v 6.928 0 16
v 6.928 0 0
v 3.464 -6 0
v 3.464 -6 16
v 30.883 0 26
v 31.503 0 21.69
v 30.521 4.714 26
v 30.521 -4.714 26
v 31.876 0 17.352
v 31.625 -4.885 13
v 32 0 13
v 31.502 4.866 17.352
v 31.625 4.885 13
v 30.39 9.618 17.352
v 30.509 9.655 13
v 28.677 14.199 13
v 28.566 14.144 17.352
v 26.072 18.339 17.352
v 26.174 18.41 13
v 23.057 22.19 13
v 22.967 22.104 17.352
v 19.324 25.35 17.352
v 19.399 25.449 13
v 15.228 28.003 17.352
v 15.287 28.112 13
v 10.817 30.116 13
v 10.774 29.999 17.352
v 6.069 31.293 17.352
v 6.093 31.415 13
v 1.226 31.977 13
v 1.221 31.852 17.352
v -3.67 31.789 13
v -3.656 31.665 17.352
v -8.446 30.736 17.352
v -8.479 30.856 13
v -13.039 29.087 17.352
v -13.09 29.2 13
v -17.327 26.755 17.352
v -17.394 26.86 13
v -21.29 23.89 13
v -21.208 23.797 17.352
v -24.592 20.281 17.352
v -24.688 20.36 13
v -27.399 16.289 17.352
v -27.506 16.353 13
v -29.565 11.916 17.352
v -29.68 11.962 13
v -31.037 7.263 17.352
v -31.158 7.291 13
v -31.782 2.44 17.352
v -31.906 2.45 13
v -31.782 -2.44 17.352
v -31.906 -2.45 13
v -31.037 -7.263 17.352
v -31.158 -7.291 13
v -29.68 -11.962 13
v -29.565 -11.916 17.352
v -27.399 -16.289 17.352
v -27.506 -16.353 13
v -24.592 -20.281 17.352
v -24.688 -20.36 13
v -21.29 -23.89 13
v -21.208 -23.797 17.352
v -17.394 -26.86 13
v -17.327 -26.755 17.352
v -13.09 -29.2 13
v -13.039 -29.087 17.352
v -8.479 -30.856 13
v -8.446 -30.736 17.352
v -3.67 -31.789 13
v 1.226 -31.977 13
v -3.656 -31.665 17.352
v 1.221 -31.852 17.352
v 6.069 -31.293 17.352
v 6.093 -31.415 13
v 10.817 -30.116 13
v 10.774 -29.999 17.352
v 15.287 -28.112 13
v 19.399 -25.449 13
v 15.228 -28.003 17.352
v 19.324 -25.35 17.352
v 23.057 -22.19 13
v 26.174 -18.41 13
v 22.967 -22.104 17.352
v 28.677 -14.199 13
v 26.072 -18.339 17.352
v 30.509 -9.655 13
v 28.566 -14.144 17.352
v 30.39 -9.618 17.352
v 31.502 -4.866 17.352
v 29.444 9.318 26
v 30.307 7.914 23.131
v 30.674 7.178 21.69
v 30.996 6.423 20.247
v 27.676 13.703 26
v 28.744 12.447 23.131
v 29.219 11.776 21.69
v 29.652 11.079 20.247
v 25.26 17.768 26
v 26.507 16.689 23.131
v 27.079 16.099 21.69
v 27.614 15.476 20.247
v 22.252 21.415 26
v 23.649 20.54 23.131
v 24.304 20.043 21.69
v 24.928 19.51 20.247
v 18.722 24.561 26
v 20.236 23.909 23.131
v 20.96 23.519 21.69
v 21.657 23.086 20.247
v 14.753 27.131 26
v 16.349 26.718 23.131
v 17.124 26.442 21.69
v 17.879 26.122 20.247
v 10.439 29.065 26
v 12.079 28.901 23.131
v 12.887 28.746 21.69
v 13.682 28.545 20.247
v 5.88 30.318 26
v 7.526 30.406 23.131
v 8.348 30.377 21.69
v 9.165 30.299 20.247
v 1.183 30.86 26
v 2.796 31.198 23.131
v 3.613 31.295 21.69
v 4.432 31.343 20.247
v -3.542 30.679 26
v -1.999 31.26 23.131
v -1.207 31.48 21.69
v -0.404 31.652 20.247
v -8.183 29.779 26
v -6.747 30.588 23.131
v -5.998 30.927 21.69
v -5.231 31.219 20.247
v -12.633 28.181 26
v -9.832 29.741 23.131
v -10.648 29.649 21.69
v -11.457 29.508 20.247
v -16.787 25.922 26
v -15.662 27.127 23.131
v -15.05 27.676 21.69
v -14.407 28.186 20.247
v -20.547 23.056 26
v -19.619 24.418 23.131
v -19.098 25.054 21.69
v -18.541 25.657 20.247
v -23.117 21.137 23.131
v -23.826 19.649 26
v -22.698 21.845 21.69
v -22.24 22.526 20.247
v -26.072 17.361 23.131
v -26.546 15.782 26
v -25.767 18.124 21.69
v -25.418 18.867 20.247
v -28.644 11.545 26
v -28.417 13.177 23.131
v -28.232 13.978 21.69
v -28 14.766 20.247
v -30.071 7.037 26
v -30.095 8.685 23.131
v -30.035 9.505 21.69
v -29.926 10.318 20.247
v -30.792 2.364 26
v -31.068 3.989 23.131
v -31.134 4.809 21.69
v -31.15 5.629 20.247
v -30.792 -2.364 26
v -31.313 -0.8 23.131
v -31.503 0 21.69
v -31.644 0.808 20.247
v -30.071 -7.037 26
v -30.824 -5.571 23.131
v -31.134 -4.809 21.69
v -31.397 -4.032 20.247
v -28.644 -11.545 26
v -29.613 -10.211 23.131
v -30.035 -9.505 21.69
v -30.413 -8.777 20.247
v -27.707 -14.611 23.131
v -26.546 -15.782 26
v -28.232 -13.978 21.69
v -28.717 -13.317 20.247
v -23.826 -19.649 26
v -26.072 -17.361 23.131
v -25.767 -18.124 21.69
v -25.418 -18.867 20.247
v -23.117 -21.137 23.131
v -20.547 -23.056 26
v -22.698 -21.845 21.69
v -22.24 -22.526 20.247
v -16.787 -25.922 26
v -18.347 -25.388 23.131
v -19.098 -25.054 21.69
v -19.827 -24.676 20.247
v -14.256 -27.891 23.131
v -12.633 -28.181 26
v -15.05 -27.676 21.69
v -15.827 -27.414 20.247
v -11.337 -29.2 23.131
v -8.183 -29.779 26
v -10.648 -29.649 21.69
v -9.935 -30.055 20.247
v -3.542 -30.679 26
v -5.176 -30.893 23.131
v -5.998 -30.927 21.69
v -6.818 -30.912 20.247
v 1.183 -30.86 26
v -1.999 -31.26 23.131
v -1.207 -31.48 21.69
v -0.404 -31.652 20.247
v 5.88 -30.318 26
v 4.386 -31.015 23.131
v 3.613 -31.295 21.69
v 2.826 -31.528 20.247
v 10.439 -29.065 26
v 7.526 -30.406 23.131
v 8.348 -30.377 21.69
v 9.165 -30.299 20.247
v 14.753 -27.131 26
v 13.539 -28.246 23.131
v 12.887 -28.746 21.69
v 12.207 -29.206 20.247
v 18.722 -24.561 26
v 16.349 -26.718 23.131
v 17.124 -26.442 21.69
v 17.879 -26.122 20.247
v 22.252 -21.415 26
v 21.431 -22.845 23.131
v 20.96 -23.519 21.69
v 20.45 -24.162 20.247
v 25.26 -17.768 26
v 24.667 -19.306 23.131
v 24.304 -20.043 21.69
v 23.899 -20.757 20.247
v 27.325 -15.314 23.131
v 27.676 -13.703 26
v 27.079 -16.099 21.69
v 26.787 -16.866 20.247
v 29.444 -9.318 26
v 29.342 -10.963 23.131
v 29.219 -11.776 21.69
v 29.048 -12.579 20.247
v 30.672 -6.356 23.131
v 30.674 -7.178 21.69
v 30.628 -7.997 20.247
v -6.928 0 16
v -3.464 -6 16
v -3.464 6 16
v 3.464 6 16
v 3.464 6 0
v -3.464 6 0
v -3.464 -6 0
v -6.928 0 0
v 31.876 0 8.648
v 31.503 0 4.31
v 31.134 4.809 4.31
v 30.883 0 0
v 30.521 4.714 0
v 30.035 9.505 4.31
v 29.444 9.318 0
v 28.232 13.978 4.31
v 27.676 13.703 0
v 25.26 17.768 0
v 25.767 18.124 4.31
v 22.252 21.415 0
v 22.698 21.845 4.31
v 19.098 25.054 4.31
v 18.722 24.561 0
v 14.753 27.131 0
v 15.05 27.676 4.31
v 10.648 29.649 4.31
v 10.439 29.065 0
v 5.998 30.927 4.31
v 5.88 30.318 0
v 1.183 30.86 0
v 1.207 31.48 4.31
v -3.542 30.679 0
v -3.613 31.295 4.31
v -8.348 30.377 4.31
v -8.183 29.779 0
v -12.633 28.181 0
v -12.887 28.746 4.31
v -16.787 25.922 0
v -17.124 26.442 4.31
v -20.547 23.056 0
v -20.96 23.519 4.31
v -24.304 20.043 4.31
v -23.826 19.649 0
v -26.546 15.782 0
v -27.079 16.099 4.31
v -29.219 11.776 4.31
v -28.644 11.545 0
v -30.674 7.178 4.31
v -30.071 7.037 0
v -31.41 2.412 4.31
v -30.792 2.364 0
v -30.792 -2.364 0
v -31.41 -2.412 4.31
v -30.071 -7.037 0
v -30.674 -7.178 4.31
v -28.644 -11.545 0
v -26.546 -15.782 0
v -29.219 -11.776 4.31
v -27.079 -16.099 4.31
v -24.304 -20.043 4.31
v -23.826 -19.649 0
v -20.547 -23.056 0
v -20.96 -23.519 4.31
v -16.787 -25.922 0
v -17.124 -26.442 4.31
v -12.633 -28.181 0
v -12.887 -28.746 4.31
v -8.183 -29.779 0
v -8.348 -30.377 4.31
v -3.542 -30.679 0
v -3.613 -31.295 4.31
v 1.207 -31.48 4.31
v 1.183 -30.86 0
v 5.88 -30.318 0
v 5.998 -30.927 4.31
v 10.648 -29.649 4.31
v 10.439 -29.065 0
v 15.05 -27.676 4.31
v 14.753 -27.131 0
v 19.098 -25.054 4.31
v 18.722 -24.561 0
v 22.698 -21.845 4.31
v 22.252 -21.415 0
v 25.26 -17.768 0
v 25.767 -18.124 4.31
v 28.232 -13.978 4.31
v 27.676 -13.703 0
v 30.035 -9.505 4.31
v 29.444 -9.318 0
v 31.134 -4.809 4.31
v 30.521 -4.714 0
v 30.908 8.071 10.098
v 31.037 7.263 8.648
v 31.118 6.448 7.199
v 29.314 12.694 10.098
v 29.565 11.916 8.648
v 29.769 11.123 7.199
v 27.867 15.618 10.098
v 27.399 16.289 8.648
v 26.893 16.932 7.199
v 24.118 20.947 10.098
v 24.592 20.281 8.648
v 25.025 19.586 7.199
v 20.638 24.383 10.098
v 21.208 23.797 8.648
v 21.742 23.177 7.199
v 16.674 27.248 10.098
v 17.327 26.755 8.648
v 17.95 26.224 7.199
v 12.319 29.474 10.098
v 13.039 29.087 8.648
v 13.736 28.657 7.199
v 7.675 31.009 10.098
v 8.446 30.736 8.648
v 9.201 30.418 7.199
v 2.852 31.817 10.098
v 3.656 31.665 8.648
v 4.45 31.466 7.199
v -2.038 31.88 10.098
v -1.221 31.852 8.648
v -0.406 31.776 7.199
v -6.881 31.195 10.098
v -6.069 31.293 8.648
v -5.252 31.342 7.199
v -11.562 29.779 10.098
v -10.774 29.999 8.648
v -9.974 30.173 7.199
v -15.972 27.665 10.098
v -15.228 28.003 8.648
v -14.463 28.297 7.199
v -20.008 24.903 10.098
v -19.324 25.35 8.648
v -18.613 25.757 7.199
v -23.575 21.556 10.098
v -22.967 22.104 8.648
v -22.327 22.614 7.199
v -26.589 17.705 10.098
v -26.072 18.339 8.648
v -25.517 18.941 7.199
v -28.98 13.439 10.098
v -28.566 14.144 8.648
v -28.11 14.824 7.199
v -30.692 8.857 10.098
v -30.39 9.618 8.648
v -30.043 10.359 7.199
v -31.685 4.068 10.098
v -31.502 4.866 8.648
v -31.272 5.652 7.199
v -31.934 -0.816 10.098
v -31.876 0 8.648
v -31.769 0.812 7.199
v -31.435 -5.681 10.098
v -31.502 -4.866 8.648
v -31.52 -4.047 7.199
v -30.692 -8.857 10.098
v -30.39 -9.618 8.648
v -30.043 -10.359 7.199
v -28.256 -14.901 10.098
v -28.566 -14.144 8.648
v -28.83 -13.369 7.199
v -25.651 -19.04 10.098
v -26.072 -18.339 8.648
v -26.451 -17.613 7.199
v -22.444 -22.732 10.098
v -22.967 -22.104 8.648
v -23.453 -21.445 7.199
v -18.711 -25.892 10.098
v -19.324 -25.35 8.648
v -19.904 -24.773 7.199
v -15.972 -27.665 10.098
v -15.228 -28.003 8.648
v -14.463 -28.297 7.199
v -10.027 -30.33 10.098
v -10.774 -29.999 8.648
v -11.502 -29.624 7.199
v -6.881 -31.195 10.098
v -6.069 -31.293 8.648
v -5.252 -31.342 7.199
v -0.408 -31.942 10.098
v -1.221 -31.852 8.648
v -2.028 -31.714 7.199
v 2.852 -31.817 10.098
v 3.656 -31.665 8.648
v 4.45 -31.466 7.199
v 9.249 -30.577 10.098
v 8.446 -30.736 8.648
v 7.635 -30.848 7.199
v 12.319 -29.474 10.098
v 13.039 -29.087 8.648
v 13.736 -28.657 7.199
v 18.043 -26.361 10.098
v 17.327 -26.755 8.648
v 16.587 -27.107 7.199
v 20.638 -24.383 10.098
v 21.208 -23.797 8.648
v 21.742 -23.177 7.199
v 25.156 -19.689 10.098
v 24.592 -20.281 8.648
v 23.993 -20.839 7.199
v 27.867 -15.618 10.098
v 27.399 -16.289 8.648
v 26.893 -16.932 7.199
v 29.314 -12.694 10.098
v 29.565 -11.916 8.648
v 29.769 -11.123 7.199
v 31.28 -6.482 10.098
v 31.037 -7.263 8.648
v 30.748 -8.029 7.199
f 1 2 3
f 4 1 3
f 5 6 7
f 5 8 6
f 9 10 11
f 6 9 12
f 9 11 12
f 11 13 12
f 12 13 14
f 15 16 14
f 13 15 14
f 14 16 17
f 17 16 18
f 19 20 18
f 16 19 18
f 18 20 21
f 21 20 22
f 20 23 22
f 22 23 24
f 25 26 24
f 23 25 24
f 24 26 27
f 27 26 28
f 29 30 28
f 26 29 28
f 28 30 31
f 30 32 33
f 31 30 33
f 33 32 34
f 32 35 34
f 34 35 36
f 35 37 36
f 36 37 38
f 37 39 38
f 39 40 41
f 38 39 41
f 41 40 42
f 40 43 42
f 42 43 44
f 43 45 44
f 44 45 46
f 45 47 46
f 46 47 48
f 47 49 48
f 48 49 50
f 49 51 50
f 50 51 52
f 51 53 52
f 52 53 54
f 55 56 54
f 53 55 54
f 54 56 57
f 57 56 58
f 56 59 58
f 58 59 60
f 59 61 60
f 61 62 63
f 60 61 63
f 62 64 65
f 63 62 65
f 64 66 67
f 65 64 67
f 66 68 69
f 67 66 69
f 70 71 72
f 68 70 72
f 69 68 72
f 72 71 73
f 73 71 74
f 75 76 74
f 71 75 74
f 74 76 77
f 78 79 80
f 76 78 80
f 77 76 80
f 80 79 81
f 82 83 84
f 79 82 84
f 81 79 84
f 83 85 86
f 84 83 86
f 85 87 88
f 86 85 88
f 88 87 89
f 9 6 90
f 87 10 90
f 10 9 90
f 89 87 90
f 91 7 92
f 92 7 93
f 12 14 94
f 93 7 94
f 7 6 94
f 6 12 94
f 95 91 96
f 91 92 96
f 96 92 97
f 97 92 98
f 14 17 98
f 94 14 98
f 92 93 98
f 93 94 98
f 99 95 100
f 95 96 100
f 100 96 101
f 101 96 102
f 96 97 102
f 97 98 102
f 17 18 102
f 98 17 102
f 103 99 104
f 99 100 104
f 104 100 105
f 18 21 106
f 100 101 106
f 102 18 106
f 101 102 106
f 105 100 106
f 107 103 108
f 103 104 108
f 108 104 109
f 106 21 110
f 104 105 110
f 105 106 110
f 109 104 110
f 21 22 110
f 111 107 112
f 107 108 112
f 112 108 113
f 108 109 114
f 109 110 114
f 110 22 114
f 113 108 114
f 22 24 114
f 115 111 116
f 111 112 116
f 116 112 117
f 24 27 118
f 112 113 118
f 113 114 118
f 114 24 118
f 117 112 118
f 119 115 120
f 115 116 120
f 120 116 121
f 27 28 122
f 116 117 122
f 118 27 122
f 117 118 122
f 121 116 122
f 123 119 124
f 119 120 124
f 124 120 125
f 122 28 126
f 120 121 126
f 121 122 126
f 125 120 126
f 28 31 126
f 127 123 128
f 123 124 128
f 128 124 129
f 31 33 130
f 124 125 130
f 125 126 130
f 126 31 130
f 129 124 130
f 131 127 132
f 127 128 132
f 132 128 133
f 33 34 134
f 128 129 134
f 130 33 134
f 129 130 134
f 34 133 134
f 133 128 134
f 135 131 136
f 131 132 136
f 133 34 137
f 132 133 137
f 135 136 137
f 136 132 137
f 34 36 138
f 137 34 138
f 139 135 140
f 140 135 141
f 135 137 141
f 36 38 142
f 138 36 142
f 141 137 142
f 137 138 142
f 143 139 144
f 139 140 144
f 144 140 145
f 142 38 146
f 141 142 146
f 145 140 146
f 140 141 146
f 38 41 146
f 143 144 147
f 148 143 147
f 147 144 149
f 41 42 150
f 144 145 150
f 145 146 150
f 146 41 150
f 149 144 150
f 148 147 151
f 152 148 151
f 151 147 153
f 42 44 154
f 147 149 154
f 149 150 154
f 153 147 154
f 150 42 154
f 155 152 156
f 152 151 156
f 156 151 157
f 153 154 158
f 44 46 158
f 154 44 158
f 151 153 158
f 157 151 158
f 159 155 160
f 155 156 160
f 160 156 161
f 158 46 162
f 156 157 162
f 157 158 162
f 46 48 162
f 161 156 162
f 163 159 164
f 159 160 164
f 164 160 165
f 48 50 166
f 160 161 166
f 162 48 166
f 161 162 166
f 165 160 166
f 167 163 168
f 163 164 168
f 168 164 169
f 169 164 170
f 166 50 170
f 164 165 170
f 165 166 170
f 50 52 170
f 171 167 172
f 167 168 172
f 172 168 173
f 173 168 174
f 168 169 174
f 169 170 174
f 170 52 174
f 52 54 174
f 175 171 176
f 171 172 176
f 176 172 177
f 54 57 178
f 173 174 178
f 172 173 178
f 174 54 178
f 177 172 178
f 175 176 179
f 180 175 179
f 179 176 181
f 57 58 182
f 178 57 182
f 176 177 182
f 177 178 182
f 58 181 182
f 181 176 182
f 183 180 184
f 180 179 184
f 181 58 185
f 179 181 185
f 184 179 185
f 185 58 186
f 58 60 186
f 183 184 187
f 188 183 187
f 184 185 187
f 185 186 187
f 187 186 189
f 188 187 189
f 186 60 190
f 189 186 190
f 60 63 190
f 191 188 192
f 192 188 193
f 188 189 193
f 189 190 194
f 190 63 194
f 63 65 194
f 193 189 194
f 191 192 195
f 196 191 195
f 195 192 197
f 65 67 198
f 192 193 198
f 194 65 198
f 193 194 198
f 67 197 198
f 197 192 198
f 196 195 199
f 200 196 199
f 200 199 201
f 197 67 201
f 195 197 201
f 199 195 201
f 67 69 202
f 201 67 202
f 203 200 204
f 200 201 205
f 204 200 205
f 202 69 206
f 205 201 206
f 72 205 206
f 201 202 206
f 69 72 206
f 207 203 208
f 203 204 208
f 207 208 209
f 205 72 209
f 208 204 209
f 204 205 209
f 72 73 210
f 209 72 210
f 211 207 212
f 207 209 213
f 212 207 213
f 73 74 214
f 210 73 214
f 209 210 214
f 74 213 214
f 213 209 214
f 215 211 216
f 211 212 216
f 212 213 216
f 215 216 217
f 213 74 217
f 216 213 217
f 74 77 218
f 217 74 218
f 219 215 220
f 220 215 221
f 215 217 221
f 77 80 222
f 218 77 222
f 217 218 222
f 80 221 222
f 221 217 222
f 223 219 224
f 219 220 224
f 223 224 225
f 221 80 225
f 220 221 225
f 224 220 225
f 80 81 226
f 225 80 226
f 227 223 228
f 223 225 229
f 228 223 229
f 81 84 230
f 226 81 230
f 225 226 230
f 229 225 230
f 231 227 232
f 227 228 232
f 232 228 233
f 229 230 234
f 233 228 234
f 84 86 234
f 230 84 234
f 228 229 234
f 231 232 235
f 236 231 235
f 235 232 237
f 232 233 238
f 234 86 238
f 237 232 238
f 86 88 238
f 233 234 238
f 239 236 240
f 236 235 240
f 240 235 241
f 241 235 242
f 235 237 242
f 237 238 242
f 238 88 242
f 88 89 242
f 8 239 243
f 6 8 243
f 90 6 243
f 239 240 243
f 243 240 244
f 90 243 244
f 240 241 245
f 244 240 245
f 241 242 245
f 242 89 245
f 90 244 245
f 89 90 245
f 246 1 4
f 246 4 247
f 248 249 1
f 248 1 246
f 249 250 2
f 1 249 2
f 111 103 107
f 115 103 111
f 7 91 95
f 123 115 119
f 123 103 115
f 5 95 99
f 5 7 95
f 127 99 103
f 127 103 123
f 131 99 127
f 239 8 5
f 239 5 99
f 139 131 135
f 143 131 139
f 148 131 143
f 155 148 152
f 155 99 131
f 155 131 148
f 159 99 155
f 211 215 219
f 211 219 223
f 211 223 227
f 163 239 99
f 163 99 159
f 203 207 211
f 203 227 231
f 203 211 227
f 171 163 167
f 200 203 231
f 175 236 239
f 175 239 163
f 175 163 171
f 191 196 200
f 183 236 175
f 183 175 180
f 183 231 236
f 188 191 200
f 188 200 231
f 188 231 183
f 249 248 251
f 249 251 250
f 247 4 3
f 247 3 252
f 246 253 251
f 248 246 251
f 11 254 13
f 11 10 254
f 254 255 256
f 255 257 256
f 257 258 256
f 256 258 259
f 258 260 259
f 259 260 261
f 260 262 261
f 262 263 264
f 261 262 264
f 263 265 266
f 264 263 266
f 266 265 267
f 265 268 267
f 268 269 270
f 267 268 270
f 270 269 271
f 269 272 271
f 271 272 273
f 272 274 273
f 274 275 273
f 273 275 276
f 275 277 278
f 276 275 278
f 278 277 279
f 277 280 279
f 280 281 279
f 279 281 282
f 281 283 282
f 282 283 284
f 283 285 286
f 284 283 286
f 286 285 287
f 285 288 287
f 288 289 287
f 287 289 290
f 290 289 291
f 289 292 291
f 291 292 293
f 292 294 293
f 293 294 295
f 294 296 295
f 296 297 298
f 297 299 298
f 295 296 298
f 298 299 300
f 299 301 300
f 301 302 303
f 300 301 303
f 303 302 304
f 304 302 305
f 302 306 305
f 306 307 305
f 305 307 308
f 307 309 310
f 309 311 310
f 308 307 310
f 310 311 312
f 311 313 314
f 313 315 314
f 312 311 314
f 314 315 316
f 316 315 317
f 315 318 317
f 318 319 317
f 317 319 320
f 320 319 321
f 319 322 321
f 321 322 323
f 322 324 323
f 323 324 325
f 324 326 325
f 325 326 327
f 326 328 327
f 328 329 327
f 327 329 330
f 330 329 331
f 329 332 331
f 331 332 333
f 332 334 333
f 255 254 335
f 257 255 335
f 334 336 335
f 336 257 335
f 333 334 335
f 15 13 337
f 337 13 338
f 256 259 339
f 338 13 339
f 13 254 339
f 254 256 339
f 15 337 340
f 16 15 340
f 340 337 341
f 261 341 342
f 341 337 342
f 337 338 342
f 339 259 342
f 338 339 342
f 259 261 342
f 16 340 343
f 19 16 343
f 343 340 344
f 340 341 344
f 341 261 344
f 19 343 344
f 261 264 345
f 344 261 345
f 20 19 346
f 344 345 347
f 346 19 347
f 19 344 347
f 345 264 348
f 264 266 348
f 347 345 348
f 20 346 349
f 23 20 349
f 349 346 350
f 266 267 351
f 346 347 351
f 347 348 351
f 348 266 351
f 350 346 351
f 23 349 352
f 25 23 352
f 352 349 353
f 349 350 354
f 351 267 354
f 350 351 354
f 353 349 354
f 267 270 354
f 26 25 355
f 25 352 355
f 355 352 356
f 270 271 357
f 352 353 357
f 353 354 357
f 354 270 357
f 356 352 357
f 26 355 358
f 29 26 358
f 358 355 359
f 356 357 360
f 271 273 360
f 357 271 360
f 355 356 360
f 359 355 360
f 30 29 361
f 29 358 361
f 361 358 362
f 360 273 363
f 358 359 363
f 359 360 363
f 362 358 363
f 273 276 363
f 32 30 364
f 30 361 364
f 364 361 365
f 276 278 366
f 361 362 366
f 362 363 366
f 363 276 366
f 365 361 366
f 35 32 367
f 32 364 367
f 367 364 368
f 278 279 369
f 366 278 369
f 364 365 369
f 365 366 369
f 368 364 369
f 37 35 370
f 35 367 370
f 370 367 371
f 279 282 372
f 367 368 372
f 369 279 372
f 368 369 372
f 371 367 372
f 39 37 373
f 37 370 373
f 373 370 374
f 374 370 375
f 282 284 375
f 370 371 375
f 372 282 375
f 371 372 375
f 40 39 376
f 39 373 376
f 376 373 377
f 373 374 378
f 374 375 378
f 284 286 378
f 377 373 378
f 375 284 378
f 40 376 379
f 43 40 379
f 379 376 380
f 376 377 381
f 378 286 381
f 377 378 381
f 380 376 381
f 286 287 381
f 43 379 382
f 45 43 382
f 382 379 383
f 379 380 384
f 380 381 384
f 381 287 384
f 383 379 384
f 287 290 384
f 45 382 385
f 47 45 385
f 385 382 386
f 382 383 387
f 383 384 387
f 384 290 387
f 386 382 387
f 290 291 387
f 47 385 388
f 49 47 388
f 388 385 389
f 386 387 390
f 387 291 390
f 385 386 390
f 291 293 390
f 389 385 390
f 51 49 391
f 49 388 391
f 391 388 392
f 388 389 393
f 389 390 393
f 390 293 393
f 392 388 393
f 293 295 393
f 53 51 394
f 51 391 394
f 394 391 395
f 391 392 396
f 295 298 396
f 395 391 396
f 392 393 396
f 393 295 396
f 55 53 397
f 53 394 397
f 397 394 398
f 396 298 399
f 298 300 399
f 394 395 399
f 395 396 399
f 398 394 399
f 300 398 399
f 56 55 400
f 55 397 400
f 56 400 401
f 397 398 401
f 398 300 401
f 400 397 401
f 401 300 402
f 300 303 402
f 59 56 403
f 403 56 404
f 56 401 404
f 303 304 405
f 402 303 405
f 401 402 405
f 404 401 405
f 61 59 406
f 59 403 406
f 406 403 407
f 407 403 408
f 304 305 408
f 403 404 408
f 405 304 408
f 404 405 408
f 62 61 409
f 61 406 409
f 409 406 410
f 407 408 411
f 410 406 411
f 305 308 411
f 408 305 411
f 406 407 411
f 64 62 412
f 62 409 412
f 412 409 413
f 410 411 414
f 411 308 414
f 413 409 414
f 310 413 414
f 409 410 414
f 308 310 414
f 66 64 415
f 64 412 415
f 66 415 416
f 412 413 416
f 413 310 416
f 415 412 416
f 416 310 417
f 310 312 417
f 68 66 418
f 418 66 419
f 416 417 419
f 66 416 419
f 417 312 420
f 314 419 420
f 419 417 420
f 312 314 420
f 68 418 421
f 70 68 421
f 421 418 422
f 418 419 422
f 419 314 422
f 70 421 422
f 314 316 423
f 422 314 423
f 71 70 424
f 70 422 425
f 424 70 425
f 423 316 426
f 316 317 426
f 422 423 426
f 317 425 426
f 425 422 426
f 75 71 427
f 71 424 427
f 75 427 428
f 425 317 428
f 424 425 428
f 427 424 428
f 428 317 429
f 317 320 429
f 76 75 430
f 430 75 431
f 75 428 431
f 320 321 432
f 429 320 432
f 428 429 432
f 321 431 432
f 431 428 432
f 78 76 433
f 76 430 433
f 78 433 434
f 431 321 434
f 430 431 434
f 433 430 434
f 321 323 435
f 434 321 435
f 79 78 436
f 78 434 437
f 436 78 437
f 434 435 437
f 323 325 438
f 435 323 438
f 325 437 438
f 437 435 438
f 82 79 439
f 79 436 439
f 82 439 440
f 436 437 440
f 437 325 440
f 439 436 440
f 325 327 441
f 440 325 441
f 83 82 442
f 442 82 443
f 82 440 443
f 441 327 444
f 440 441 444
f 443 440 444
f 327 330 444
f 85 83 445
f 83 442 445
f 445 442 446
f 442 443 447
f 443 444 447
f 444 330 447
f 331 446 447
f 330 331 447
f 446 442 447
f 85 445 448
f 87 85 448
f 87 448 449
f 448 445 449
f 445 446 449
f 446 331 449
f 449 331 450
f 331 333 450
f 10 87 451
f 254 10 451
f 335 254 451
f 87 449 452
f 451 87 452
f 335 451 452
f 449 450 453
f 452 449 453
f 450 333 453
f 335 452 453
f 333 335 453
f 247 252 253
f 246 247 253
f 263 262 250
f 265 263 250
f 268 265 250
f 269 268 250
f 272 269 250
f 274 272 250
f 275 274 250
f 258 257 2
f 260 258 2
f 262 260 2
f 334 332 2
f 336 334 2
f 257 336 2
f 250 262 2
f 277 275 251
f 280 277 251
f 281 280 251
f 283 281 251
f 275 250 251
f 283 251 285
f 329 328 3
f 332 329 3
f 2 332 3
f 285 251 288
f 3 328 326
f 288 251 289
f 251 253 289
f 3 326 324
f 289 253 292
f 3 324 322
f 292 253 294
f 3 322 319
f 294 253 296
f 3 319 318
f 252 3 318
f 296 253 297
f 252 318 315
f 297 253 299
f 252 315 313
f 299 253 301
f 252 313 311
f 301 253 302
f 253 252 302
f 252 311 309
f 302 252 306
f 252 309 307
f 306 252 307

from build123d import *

# Parameters (mm, degrees)
CROQUIS1_R              = 32
SALIENTE_EXTRUIR1_DEPTH = 26
CORTAR_EXTRUIR1_DEPTH   = 16


# Read off the part's stored shape, not the designer's step: Cortar-Revolución-Lámina1
with BuildPart() as part:
    # Croquis1 → Saliente-Extruir1 (new body)
    with BuildSketch(Plane.XY):
        with Locations(Location((0, 0, 0), (0, 0, 180))):
            Circle(CROQUIS1_R)
    extrude(amount=SALIENTE_EXTRUIR1_DEPTH)

    # Cortar-Revolución-Lámina1 outline → Cortar-Revolución-Lámina1 (revolve, cut)
    with BuildSketch(Plane.XZ):
        with BuildLine():
            ThreePointArc((32, 13), (31.720208212, 6.476045289), (30.882887531, 0))
            Line((30.882887531, 0), (32, 0))
            Line((32, 0), (32, 13))
        make_face()
        with BuildLine():
            ThreePointArc((30.882887531, 26), (31.720208212, 19.523954711), (32, 13))
            Line((32, 13), (32, 26))
            Line((32, 26), (30.882887531, 26))
        make_face()
    revolve(axis=Axis((0, 0, 0), (0, 0, 1)), mode=Mode.SUBTRACT)

    # Croquis3 → Cortar-Extruir1 (cut)
    with BuildSketch(Plane(origin=(0, 0, 0), x_dir=(-1, 0, 0), z_dir=(0, 0, -1))):
        Polygon((3.464101615, -6), (6.92820323, 0), (3.464101615, 6), (-3.464101615, 6), (-6.92820323, 0), (-3.464101615, -6), align=None)
    extrude(amount=-CORTAR_EXTRUIR1_DEPTH, mode=Mode.SUBTRACT)


solid = part.part
